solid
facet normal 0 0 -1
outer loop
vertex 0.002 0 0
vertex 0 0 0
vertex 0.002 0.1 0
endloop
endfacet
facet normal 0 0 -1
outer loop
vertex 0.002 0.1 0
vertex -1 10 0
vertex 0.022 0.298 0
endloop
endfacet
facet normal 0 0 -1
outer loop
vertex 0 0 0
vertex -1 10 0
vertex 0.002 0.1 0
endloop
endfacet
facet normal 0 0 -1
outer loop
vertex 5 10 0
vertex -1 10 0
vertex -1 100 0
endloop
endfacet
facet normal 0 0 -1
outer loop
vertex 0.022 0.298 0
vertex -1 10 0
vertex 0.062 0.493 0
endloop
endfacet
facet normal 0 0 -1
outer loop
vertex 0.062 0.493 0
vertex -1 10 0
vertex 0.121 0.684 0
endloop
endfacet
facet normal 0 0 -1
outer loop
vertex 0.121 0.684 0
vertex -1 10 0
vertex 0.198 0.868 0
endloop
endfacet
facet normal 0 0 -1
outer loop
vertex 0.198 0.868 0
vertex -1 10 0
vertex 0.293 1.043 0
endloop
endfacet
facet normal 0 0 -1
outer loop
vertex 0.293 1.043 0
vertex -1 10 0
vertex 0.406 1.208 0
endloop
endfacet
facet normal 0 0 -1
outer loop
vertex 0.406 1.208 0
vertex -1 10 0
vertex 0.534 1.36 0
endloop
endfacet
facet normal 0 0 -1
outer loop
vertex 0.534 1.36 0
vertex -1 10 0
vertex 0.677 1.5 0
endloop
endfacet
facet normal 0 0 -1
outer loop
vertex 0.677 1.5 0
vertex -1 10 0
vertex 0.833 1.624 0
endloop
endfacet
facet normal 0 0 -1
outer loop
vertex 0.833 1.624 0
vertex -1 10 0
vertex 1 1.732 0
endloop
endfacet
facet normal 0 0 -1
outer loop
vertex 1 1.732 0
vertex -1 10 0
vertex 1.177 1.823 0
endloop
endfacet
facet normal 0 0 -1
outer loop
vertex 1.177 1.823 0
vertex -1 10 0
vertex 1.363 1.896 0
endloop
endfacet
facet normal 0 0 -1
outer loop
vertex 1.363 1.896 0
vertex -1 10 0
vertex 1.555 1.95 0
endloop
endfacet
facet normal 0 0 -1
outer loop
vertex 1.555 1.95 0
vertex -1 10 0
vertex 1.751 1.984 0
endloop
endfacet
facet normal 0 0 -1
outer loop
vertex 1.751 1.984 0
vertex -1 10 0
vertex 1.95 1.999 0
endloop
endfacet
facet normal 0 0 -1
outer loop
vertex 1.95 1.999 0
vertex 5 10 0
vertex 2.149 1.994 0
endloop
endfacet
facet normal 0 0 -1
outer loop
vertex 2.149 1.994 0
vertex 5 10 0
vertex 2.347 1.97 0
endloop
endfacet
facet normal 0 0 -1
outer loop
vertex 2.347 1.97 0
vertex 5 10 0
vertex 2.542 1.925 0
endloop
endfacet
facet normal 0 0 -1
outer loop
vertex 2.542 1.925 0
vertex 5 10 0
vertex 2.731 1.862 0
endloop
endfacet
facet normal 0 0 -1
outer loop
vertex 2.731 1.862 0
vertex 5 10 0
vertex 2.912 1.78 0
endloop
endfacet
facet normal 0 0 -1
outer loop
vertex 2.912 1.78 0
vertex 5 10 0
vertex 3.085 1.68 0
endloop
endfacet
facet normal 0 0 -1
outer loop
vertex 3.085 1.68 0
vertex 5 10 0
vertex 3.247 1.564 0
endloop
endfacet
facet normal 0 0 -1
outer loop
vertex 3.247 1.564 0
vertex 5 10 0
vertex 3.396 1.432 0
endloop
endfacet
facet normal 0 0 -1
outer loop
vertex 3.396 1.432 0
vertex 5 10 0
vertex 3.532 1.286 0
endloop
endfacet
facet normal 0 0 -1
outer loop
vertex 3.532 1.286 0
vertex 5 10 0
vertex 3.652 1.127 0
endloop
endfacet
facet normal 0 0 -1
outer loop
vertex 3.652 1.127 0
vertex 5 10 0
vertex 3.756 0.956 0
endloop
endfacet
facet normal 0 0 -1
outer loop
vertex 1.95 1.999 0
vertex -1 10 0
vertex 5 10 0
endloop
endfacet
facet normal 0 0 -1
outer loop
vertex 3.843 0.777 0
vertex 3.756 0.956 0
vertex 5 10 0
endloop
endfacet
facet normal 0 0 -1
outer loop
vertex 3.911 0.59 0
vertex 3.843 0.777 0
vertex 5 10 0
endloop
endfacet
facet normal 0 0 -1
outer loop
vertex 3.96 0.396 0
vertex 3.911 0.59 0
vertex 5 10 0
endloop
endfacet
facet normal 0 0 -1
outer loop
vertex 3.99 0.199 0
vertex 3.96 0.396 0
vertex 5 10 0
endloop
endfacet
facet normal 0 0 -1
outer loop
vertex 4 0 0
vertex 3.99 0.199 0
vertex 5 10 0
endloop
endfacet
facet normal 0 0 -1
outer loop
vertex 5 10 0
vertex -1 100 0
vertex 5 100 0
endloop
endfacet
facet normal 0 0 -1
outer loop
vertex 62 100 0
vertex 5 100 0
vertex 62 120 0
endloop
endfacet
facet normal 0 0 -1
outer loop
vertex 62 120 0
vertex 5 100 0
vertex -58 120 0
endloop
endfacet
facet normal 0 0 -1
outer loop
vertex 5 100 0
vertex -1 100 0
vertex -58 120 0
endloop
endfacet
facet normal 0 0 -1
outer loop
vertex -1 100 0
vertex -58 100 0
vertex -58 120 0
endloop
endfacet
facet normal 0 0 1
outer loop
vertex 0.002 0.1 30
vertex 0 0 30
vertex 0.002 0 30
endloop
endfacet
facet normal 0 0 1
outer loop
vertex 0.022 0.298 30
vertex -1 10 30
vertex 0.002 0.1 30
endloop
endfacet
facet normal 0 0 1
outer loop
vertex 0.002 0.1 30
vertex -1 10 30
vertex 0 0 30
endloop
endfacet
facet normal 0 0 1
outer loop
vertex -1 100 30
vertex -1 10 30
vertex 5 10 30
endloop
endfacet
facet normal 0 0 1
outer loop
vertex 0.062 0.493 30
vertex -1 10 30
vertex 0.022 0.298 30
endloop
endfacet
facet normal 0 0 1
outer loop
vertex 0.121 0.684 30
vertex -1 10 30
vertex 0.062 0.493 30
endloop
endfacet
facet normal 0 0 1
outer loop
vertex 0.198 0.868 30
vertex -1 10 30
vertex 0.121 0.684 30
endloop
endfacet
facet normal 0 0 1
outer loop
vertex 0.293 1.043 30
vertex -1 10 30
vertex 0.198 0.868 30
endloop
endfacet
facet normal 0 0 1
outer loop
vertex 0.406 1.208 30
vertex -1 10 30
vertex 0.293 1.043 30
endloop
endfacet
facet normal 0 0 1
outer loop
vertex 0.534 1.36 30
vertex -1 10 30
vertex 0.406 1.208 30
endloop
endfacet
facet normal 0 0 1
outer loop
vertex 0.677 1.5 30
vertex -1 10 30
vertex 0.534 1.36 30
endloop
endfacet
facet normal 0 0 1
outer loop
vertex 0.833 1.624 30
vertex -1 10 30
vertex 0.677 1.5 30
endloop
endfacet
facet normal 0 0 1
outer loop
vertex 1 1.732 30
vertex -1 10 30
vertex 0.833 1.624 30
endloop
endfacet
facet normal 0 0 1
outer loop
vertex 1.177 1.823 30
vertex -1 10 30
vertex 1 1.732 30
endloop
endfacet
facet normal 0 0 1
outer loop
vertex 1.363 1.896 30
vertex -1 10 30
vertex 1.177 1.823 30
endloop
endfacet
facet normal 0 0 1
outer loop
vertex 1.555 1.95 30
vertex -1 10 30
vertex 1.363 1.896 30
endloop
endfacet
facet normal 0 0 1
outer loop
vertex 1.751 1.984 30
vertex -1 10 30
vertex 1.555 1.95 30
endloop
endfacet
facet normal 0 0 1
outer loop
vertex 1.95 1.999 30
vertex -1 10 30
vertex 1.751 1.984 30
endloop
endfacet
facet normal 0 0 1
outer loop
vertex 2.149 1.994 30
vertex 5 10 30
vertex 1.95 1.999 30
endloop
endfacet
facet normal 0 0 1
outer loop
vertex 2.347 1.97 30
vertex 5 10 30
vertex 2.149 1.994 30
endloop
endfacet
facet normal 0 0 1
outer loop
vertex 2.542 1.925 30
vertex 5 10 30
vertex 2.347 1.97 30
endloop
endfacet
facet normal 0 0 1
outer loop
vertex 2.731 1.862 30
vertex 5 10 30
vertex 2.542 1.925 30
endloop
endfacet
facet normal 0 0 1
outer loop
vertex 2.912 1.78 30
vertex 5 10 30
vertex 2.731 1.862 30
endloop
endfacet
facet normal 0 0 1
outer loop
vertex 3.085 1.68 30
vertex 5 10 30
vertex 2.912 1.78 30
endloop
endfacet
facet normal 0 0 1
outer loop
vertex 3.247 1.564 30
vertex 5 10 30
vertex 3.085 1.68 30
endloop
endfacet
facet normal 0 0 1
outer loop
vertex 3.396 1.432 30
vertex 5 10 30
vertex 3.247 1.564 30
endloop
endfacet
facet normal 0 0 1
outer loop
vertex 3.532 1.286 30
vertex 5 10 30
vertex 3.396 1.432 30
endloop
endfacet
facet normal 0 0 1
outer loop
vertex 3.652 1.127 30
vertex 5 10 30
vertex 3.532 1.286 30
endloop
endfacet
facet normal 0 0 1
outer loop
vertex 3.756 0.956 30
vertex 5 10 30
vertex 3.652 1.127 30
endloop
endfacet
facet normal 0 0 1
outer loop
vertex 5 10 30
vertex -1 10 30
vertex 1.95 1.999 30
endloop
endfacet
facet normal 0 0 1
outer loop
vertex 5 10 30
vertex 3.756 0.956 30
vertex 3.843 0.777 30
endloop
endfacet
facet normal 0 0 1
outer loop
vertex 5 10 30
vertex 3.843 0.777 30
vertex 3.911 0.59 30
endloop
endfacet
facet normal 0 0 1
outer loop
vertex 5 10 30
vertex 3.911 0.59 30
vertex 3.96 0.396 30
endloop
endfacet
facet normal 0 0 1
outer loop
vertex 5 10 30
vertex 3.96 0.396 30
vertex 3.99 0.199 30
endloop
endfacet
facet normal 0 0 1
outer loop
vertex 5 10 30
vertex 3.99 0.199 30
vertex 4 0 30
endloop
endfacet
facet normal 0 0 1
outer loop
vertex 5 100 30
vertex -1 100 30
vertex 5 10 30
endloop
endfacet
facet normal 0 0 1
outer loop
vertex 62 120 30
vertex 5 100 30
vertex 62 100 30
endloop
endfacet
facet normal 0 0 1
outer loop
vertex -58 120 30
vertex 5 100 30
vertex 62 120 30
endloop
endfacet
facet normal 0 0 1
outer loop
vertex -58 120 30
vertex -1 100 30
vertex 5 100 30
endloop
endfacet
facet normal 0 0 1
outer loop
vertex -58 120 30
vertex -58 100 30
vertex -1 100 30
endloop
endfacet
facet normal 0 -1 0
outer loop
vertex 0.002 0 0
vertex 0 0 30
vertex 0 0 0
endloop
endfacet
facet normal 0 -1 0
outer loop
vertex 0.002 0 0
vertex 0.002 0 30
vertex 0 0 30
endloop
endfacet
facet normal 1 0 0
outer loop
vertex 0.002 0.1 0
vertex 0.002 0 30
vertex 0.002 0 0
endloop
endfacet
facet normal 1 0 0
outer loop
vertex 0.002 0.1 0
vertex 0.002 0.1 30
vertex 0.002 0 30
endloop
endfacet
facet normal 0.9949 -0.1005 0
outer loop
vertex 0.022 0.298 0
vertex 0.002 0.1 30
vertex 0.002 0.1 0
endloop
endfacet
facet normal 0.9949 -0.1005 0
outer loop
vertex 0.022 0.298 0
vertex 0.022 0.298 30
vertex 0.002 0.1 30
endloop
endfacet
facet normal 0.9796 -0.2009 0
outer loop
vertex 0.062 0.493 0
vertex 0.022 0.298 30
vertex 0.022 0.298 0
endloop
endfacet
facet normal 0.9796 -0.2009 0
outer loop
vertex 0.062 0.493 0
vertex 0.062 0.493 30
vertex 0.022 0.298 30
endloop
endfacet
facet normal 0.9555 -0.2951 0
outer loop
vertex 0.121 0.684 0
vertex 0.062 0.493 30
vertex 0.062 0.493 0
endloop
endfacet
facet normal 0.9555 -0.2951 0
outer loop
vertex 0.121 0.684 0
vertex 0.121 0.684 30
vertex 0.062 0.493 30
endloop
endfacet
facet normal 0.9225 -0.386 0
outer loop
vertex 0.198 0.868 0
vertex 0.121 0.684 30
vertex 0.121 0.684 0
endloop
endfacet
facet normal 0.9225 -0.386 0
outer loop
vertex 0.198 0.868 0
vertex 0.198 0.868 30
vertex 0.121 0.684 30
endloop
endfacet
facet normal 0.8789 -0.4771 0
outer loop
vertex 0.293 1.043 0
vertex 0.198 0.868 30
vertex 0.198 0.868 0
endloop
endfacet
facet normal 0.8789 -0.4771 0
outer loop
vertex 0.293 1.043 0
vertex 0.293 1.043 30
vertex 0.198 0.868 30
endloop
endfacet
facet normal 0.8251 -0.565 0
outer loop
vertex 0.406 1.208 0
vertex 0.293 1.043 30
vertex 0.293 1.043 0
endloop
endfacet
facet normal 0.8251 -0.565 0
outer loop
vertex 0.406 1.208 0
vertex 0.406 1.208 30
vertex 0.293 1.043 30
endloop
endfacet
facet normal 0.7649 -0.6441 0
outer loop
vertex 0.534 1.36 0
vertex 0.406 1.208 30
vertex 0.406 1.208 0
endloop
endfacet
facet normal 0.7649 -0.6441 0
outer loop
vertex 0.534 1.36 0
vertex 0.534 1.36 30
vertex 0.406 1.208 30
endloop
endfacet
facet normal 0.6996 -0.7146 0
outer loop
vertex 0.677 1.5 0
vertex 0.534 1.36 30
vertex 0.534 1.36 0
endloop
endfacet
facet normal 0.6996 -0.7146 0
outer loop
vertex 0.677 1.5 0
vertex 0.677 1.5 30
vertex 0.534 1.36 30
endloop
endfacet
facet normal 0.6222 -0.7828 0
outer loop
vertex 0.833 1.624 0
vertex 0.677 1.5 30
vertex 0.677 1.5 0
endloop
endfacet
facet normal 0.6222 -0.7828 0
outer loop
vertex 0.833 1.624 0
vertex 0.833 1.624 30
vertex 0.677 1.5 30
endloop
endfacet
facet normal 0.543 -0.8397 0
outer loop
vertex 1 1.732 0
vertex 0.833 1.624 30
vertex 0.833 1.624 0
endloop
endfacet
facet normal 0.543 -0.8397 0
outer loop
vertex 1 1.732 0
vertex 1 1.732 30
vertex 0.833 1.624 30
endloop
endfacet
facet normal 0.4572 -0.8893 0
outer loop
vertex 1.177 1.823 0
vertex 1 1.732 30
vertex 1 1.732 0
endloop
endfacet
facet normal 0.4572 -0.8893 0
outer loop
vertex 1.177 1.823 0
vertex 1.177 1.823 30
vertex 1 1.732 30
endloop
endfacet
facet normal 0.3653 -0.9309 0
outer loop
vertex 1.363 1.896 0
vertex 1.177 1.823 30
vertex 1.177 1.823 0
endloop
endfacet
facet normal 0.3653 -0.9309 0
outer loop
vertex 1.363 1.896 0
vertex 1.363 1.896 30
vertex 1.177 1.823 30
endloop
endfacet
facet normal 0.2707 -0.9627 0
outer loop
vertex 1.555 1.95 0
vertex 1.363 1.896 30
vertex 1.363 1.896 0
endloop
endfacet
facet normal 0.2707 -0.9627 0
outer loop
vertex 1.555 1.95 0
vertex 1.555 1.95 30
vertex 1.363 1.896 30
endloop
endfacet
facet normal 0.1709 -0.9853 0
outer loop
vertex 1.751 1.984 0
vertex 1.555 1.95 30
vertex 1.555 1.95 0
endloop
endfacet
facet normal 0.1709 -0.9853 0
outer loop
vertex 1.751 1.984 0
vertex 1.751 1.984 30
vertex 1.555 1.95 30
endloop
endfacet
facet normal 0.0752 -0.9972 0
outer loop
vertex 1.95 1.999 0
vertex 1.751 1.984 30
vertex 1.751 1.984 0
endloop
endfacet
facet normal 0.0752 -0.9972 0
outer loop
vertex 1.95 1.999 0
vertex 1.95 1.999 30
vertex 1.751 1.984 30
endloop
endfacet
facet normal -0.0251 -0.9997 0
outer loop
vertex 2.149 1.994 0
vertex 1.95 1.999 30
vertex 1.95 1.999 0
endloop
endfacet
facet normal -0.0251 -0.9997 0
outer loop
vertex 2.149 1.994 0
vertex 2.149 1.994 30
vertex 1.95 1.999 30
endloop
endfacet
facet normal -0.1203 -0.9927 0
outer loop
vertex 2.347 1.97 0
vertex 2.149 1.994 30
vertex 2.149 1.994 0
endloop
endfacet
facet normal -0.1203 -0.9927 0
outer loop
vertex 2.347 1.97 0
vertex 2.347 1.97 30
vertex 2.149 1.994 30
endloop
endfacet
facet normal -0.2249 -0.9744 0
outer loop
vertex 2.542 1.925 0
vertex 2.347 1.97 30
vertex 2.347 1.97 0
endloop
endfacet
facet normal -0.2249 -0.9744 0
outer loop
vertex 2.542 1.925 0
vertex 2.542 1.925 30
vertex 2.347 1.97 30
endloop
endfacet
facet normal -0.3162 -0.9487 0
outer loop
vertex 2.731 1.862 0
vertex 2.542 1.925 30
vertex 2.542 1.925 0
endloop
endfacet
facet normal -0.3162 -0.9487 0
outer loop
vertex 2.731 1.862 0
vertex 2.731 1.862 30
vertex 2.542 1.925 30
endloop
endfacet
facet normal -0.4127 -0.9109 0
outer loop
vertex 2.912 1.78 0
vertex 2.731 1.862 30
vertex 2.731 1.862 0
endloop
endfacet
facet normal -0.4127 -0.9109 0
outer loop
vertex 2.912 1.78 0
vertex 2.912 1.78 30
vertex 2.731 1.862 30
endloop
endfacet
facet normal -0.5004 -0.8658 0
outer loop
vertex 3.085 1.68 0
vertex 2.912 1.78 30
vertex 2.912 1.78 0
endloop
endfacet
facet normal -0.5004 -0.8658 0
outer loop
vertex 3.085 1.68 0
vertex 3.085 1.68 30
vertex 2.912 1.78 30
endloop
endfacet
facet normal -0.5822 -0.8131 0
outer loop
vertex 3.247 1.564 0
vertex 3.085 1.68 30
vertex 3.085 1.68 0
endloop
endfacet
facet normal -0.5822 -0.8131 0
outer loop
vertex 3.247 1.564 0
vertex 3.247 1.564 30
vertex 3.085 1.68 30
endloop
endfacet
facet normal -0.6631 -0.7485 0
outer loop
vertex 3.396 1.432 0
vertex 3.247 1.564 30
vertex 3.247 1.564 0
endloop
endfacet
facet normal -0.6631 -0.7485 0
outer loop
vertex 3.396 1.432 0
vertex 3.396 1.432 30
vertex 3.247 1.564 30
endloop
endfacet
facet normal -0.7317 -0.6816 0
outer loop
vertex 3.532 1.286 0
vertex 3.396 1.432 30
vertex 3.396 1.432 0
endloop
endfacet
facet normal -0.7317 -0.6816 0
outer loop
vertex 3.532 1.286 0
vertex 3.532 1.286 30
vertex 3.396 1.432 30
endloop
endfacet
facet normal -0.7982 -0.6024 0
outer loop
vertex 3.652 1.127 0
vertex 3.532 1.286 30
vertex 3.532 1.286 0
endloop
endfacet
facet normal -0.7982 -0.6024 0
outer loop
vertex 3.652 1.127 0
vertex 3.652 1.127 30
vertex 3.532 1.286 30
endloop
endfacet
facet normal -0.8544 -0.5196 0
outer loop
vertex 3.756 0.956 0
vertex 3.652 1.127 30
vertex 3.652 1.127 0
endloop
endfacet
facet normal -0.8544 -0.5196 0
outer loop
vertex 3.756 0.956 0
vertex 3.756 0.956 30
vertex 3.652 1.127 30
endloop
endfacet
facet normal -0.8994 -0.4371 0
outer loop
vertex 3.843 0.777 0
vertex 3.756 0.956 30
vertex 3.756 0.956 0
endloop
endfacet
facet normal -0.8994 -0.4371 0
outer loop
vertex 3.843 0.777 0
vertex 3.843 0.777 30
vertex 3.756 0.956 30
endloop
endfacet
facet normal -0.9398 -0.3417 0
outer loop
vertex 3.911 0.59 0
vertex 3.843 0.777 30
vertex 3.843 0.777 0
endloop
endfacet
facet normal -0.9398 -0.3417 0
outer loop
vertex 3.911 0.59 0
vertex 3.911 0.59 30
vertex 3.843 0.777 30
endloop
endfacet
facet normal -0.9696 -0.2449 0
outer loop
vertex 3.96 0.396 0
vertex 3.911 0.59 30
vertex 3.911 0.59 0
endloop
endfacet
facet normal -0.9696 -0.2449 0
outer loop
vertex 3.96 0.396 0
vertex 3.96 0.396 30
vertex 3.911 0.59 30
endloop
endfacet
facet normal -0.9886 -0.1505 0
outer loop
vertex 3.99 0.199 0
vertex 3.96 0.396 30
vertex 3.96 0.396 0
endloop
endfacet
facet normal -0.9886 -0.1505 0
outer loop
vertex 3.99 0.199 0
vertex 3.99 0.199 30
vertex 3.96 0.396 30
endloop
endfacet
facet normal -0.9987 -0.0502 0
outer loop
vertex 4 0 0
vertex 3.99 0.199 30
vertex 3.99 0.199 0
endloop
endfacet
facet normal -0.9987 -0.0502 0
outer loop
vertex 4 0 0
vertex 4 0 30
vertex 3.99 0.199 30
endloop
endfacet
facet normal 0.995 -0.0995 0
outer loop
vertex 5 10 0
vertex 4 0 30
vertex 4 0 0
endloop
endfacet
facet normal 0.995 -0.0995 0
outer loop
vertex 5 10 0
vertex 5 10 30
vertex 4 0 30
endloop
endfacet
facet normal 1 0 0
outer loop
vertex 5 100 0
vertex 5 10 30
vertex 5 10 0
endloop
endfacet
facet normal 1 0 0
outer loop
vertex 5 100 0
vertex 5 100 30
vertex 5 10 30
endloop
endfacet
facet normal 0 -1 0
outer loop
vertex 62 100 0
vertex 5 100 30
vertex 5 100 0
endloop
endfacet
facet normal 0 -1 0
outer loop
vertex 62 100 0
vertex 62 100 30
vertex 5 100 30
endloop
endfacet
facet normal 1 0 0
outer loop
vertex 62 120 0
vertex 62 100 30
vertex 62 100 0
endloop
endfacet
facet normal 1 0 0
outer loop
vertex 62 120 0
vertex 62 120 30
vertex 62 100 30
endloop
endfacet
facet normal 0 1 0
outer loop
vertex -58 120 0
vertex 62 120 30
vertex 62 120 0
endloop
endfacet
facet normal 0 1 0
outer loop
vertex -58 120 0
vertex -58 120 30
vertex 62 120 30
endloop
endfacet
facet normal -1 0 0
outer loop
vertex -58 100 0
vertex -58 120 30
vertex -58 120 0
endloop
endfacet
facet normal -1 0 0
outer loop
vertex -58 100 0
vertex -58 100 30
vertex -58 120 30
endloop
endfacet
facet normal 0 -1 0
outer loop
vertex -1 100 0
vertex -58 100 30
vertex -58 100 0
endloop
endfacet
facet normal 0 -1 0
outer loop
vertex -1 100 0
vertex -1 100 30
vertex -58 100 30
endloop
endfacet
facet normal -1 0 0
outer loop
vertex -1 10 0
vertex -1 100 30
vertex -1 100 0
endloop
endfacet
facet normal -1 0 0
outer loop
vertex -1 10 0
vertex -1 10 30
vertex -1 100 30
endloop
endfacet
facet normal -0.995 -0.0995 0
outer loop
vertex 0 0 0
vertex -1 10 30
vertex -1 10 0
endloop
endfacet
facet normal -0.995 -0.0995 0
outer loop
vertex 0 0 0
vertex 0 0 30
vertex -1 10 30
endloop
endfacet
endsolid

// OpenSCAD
length = 100;
diameter = 4;
handleWidth = 120;
handleHeight = 20;
thickness = 30;

stickWidth = 6;
stickLead = 10;

$fa = 0.2;
$fs = 0.2;

linear_extrude(thickness) {
    difference() {
        hull() {
            square([diameter, length]);
            
            translate([(diameter / 2) - 1 + stickWidth / 2, stickLead])
            square([1, length - stickLead]);
            
            translate([(diameter / 2) - stickWidth / 2, stickLead])
            square([1, length - stickLead]);
        }
        
        translate([diameter / 2, 0, 0])
        circle(d = diameter);
    }
    
    translate([(diameter - handleWidth) / 2, length])
    square([handleWidth, handleHeight]);
}
